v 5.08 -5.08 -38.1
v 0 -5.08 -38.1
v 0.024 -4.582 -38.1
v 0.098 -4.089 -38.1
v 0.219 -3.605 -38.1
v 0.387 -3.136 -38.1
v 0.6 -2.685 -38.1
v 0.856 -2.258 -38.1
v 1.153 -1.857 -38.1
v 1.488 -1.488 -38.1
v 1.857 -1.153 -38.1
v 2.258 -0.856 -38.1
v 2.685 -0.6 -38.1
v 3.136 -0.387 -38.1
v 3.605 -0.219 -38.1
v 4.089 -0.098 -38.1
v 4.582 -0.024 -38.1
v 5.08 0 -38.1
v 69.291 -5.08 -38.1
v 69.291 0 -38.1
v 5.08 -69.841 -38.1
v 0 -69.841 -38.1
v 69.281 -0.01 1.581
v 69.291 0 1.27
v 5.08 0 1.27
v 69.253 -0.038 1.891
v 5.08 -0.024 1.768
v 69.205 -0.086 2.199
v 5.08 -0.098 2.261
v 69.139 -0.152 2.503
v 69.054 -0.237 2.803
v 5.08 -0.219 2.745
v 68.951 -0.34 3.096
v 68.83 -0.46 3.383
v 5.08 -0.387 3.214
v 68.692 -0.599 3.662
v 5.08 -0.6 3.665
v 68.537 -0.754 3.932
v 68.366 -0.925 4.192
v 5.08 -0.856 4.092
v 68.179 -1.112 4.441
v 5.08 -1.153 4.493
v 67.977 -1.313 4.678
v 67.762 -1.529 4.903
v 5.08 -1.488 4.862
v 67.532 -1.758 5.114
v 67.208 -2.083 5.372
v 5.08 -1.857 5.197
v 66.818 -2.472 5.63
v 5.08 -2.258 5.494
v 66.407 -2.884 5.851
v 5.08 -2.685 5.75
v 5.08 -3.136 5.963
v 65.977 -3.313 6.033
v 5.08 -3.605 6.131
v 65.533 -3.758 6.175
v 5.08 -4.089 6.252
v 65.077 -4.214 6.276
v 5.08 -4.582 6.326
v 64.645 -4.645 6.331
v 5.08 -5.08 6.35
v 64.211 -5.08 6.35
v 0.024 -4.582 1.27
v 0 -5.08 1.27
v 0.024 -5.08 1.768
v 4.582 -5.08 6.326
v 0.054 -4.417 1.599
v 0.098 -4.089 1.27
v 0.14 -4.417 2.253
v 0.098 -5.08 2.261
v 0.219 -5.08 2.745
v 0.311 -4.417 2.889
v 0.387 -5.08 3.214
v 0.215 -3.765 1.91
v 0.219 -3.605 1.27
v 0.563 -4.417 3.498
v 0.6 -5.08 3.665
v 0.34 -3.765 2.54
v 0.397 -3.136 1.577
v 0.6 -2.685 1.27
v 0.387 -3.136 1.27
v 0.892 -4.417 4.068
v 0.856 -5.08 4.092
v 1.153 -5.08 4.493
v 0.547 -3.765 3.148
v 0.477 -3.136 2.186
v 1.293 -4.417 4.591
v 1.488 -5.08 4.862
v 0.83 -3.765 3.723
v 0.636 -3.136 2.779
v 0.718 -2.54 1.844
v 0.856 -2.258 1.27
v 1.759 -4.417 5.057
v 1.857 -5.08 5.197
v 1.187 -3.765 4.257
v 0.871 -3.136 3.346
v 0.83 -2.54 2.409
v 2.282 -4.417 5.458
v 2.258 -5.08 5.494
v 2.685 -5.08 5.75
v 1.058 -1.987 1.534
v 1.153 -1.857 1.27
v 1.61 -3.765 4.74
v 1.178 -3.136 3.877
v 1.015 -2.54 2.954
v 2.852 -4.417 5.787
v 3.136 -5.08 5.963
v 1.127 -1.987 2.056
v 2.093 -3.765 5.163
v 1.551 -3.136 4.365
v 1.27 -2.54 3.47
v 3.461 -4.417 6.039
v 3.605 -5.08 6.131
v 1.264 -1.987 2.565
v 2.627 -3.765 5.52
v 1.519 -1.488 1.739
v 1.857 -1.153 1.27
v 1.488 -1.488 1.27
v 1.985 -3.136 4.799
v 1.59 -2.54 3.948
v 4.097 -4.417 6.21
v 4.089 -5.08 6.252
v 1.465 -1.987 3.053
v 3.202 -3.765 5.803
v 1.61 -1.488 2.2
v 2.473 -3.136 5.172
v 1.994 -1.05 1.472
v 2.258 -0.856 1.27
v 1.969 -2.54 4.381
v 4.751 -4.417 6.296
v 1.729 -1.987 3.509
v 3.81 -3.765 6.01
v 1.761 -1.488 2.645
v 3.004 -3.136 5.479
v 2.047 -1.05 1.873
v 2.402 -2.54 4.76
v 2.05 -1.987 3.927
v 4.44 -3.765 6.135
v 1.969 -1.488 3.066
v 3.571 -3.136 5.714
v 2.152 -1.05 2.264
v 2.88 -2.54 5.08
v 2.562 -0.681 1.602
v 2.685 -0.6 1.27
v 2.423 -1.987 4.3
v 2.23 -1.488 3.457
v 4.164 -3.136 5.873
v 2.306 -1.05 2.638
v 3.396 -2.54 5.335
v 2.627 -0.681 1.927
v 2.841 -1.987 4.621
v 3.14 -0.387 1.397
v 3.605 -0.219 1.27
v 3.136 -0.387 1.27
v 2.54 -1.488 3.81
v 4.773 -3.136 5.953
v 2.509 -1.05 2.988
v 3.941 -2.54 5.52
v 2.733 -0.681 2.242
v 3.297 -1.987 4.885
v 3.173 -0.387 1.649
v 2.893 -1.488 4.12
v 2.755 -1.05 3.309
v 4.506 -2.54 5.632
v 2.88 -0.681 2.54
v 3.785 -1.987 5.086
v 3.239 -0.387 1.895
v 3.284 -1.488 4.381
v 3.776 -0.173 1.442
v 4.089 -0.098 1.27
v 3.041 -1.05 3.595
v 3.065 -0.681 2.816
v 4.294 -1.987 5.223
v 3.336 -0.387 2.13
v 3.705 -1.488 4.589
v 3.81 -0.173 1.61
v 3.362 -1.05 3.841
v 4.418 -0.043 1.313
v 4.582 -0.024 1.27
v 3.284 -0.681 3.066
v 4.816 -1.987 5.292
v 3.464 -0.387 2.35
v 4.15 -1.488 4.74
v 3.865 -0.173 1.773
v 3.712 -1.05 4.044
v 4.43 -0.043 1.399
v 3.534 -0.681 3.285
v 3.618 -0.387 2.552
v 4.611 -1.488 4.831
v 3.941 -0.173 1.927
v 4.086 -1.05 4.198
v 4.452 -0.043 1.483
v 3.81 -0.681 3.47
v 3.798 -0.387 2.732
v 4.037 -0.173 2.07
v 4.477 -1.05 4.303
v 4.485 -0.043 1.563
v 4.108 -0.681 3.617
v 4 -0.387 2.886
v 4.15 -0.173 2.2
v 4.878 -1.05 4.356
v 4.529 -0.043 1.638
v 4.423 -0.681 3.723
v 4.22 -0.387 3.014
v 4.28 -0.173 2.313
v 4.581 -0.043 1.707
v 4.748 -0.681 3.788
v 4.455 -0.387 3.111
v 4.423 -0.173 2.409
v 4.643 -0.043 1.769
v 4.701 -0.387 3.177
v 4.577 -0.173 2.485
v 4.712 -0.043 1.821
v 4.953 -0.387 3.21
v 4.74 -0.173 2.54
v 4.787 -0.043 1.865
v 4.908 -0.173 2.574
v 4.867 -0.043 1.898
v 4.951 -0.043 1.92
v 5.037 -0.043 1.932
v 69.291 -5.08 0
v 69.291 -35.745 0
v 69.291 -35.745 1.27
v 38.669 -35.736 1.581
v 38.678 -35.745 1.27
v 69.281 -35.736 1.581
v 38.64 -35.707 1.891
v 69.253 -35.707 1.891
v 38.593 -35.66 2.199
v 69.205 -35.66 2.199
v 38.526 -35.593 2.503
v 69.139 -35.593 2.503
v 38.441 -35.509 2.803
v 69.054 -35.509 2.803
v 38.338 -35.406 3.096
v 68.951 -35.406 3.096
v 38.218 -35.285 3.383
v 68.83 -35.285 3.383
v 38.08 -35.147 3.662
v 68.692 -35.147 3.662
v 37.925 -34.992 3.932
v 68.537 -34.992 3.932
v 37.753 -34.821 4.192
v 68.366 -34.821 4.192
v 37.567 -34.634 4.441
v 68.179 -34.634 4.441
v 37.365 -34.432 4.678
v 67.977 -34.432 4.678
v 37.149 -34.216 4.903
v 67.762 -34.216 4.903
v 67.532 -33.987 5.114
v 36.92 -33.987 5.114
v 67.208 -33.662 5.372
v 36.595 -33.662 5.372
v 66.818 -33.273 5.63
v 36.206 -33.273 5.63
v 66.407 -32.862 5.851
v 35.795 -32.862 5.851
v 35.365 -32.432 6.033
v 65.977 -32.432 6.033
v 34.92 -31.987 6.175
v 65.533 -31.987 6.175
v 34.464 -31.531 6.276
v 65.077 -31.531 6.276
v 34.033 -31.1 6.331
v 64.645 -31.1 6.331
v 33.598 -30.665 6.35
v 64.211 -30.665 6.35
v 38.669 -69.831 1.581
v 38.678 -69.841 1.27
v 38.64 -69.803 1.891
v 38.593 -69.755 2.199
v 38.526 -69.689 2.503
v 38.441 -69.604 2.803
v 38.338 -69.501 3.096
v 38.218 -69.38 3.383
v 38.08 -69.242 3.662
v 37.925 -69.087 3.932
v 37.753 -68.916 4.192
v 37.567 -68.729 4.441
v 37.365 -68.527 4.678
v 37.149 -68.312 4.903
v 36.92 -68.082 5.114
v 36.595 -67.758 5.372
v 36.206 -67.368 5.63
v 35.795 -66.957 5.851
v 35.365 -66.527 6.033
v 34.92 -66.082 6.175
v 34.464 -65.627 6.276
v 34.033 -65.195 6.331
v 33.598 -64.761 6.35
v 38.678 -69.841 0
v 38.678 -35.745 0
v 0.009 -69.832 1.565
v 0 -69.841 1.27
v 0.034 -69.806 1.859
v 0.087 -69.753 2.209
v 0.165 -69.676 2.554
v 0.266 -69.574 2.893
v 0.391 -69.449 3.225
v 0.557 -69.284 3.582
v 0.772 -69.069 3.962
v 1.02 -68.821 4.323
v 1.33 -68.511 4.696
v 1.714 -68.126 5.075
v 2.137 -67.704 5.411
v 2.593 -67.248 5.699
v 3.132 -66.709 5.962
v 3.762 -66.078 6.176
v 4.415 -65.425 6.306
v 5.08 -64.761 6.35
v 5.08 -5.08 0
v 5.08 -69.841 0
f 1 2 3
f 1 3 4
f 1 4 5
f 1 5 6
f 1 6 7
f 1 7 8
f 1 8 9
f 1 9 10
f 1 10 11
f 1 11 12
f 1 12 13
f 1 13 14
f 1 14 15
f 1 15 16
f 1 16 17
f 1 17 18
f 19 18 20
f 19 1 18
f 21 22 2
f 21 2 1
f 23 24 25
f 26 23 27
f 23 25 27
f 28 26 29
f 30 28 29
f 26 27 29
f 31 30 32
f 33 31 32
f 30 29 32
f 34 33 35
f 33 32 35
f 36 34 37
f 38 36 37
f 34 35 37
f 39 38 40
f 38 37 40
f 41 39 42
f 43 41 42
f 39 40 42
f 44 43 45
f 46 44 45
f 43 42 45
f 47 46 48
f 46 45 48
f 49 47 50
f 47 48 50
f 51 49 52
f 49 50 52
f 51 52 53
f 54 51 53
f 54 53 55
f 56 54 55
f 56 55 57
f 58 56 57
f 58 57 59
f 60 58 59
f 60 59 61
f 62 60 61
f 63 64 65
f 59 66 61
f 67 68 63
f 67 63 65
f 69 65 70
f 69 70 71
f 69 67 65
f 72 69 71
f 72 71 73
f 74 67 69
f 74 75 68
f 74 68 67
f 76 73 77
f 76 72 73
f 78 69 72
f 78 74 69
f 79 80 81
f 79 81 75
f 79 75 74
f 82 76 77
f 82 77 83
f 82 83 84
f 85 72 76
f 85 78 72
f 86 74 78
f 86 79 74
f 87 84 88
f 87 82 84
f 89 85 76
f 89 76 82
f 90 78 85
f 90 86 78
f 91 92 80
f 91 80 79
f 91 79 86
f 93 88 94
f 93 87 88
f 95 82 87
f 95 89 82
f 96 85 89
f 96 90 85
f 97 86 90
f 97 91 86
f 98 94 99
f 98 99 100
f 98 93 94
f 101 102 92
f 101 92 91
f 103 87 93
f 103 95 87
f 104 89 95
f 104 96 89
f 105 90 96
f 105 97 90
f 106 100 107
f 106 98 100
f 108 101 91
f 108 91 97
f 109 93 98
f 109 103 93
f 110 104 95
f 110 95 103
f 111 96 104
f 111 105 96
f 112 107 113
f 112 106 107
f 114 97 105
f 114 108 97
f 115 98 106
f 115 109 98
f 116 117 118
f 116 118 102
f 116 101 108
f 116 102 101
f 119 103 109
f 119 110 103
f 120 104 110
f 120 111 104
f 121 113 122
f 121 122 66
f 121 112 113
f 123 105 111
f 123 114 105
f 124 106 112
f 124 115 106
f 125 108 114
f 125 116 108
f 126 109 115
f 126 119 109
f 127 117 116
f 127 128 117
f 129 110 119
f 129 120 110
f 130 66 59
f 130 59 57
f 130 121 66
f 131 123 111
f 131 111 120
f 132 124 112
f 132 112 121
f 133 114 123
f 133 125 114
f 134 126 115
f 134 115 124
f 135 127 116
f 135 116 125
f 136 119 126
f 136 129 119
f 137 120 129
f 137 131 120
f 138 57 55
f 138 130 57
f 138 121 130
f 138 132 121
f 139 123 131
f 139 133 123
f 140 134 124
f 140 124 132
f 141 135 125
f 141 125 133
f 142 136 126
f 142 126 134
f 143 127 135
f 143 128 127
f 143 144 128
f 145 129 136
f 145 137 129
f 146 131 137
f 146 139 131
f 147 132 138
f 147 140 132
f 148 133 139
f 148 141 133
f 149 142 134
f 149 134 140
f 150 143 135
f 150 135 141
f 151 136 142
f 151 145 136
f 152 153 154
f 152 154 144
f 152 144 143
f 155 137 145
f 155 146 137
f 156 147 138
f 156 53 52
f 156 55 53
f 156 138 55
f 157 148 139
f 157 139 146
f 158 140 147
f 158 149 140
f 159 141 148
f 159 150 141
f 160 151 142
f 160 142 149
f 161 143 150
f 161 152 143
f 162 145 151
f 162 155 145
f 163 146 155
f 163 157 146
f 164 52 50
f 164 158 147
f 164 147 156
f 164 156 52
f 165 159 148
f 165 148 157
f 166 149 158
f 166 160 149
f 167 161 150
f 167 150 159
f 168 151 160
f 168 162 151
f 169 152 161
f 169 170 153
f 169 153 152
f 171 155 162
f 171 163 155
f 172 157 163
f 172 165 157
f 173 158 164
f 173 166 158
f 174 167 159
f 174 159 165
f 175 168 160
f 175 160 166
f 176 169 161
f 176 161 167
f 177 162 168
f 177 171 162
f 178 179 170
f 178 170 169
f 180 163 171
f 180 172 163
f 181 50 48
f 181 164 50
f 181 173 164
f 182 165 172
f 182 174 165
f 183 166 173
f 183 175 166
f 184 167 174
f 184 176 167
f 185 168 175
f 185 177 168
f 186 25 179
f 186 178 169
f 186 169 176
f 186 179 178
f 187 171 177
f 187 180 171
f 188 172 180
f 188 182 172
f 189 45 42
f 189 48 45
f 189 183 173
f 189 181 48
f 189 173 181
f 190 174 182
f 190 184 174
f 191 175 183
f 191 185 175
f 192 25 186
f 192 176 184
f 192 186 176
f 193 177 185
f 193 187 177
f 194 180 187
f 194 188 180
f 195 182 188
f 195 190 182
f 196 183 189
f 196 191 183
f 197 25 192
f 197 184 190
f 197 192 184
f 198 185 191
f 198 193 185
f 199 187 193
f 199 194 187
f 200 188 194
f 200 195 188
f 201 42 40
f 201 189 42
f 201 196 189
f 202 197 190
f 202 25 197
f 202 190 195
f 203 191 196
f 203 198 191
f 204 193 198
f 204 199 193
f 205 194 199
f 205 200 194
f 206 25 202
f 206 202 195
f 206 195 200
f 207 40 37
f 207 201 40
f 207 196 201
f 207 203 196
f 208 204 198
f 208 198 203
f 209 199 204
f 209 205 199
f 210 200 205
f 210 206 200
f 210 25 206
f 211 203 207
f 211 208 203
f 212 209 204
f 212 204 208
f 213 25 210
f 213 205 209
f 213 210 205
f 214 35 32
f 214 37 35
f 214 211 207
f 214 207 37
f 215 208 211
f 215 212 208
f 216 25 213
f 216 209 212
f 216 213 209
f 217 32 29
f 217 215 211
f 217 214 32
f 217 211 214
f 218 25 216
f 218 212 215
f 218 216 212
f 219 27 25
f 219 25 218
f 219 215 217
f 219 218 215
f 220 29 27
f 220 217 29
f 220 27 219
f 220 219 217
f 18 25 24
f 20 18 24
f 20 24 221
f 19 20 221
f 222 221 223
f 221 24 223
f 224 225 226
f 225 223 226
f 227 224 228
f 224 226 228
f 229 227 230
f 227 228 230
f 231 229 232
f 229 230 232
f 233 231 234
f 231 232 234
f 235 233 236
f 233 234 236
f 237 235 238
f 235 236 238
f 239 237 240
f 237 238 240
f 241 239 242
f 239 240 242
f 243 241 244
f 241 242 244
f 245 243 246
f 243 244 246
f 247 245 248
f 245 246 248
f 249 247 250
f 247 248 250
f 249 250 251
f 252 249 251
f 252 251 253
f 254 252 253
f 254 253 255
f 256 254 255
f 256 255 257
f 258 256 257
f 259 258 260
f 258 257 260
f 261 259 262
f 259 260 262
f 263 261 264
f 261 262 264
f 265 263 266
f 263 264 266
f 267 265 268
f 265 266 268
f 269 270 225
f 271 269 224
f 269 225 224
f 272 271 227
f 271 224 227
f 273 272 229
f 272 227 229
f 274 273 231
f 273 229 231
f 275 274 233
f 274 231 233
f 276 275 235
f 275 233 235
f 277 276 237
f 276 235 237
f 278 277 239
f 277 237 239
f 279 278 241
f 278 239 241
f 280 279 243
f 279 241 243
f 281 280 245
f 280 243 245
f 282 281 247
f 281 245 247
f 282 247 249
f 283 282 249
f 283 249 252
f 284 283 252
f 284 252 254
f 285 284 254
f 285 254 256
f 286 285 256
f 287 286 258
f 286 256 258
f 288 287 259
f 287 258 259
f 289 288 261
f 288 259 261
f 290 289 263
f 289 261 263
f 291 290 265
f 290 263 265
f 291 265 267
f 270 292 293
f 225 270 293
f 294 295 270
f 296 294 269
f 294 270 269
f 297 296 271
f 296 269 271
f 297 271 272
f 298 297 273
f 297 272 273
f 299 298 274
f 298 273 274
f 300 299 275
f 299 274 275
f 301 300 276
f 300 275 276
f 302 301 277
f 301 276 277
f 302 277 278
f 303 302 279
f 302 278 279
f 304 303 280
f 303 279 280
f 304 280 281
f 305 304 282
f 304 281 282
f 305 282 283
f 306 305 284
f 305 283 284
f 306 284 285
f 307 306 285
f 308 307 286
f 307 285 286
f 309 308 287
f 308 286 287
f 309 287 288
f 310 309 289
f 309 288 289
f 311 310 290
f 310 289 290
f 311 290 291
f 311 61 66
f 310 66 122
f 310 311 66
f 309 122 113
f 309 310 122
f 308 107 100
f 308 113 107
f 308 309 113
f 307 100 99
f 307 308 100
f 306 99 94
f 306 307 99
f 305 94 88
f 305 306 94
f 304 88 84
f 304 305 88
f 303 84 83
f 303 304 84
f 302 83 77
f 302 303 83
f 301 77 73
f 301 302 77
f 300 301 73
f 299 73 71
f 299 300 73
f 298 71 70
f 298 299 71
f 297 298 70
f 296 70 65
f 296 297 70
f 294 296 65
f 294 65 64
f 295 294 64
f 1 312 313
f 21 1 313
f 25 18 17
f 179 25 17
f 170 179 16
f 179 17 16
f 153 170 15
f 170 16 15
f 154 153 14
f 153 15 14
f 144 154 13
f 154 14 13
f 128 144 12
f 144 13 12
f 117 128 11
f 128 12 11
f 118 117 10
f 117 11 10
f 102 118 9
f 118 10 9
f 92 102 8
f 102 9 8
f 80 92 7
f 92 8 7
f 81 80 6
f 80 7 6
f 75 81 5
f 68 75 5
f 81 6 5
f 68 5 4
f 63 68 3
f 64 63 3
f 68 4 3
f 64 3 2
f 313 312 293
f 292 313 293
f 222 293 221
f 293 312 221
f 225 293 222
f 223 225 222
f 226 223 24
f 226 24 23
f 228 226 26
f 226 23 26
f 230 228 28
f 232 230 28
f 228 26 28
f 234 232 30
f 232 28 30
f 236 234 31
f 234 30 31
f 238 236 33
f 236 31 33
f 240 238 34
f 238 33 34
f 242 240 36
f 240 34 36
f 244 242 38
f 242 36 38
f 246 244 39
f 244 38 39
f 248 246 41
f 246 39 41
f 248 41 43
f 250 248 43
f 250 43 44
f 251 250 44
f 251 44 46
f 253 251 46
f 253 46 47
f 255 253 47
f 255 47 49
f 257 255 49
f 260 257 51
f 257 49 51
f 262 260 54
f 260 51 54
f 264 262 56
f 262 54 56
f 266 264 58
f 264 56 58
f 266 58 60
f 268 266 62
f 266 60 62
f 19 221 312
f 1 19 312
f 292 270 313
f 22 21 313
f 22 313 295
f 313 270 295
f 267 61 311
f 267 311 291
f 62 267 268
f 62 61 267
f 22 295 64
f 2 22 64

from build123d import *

# Parameters (mm, degrees)
F1_DEPTH    = 6.35
F3_DEPTH    = 38.1
F4_R        = 5.08
F5_T1_DEPTH = 52.07
F5_S5_W     = 5.08
F5_S5_H     = 5.08
F5_T6_DEPTH = 5.08


# Not quite as in the source:
# - a fillet or chamfer that OpenCascade refuses, or shapes differently, is made with other operations: its cross-section is extruded or revolved along the edge and cut away or added


with BuildPart() as f1:
    # F0 (on Top) → F1 (new body)
    with BuildSketch(Plane.XY):
        Polygon((69.2906975746, 0), (0, 0), (0, -69.8406398296), (38.6781543493, -69.8406398296), (38.6781543493, -35.7452183962), (69.2906975746, -35.7452183962), align=None)
    extrude(amount=F1_DEPTH)

    # F2 (on face) → F3 (join)
    with BuildSketch(Plane(origin=(0, 0, 0), x_dir=(1, 0, 0), z_dir=(0, 0, -1))):
        Polygon((5.08, 69.8406398296), (0, 69.8406398296), (0, 0), (69.2906975746, 0), (69.2906975746, 5.08), (5.08, 5.08), align=None)
    extrude(amount=F3_DEPTH)

    # F4
    f4_edges = [f1.edges().sort_by_distance(p)[0] for p in [
        (34.645349, 0, 6.35),
        (0, -34.92032, 6.35),
        (19.339077, -69.84064, 6.35),
        (38.678154, -52.792929, 6.35),
        (53.984426, -35.745218, 6.35),
        (69.290698, -17.872609, 6.35),
    ]]
    fillet(f4_edges, radius=F4_R)

    # F5: fillet of radius 5.08 on 1 edges, made by hand

    # F5_s2 → F5_t1 (cut)
    with BuildSketch(Plane.XY.offset(-50.8)):
        with BuildLine():
            ThreePointArc((5.08, 0), (1.4878975516, -1.4878975516), (0, -5.08))
            Line((0, -5.08), (0, 0))
            Line((0, 0), (5.08, 0))
        make_face()
    extrude(amount=F5_T1_DEPTH, mode=Mode.SUBTRACT)


with BuildPart() as f5_tool4:
    # F5_s5 → F5_t6 (new body)
    with BuildSketch(Plane.XZ.offset(5.08)):
        with Locations((2.54, 3.81)):
            Rectangle(F5_S5_W, F5_S5_H)
    extrude(amount=-F5_T6_DEPTH)

    # F5_s7 → F5_t8 (revolve, cut)
    with BuildSketch(Plane(origin=(5.08, -5.08, 1.27), x_dir=(0.7071067812, 0, -0.7071067812), z_dir=(0.7071067812, 0, 0.7071067812))):
        with BuildLine():
            ThreePointArc((0, -5.08), (5.08, 0), (0, 5.08))
            Line((0, 5.08), (0, -5.08))
        make_face()
    revolve(axis=Axis((5.08, -5.08, 1.27), (0, 1, 0)), mode=Mode.SUBTRACT)


with BuildPart() as f1_1:
    add(f1.part)

    # F5_t3: cut F5_tool4
    add(f5_tool4.part, mode=Mode.SUBTRACT)


solid = f1_1.part
